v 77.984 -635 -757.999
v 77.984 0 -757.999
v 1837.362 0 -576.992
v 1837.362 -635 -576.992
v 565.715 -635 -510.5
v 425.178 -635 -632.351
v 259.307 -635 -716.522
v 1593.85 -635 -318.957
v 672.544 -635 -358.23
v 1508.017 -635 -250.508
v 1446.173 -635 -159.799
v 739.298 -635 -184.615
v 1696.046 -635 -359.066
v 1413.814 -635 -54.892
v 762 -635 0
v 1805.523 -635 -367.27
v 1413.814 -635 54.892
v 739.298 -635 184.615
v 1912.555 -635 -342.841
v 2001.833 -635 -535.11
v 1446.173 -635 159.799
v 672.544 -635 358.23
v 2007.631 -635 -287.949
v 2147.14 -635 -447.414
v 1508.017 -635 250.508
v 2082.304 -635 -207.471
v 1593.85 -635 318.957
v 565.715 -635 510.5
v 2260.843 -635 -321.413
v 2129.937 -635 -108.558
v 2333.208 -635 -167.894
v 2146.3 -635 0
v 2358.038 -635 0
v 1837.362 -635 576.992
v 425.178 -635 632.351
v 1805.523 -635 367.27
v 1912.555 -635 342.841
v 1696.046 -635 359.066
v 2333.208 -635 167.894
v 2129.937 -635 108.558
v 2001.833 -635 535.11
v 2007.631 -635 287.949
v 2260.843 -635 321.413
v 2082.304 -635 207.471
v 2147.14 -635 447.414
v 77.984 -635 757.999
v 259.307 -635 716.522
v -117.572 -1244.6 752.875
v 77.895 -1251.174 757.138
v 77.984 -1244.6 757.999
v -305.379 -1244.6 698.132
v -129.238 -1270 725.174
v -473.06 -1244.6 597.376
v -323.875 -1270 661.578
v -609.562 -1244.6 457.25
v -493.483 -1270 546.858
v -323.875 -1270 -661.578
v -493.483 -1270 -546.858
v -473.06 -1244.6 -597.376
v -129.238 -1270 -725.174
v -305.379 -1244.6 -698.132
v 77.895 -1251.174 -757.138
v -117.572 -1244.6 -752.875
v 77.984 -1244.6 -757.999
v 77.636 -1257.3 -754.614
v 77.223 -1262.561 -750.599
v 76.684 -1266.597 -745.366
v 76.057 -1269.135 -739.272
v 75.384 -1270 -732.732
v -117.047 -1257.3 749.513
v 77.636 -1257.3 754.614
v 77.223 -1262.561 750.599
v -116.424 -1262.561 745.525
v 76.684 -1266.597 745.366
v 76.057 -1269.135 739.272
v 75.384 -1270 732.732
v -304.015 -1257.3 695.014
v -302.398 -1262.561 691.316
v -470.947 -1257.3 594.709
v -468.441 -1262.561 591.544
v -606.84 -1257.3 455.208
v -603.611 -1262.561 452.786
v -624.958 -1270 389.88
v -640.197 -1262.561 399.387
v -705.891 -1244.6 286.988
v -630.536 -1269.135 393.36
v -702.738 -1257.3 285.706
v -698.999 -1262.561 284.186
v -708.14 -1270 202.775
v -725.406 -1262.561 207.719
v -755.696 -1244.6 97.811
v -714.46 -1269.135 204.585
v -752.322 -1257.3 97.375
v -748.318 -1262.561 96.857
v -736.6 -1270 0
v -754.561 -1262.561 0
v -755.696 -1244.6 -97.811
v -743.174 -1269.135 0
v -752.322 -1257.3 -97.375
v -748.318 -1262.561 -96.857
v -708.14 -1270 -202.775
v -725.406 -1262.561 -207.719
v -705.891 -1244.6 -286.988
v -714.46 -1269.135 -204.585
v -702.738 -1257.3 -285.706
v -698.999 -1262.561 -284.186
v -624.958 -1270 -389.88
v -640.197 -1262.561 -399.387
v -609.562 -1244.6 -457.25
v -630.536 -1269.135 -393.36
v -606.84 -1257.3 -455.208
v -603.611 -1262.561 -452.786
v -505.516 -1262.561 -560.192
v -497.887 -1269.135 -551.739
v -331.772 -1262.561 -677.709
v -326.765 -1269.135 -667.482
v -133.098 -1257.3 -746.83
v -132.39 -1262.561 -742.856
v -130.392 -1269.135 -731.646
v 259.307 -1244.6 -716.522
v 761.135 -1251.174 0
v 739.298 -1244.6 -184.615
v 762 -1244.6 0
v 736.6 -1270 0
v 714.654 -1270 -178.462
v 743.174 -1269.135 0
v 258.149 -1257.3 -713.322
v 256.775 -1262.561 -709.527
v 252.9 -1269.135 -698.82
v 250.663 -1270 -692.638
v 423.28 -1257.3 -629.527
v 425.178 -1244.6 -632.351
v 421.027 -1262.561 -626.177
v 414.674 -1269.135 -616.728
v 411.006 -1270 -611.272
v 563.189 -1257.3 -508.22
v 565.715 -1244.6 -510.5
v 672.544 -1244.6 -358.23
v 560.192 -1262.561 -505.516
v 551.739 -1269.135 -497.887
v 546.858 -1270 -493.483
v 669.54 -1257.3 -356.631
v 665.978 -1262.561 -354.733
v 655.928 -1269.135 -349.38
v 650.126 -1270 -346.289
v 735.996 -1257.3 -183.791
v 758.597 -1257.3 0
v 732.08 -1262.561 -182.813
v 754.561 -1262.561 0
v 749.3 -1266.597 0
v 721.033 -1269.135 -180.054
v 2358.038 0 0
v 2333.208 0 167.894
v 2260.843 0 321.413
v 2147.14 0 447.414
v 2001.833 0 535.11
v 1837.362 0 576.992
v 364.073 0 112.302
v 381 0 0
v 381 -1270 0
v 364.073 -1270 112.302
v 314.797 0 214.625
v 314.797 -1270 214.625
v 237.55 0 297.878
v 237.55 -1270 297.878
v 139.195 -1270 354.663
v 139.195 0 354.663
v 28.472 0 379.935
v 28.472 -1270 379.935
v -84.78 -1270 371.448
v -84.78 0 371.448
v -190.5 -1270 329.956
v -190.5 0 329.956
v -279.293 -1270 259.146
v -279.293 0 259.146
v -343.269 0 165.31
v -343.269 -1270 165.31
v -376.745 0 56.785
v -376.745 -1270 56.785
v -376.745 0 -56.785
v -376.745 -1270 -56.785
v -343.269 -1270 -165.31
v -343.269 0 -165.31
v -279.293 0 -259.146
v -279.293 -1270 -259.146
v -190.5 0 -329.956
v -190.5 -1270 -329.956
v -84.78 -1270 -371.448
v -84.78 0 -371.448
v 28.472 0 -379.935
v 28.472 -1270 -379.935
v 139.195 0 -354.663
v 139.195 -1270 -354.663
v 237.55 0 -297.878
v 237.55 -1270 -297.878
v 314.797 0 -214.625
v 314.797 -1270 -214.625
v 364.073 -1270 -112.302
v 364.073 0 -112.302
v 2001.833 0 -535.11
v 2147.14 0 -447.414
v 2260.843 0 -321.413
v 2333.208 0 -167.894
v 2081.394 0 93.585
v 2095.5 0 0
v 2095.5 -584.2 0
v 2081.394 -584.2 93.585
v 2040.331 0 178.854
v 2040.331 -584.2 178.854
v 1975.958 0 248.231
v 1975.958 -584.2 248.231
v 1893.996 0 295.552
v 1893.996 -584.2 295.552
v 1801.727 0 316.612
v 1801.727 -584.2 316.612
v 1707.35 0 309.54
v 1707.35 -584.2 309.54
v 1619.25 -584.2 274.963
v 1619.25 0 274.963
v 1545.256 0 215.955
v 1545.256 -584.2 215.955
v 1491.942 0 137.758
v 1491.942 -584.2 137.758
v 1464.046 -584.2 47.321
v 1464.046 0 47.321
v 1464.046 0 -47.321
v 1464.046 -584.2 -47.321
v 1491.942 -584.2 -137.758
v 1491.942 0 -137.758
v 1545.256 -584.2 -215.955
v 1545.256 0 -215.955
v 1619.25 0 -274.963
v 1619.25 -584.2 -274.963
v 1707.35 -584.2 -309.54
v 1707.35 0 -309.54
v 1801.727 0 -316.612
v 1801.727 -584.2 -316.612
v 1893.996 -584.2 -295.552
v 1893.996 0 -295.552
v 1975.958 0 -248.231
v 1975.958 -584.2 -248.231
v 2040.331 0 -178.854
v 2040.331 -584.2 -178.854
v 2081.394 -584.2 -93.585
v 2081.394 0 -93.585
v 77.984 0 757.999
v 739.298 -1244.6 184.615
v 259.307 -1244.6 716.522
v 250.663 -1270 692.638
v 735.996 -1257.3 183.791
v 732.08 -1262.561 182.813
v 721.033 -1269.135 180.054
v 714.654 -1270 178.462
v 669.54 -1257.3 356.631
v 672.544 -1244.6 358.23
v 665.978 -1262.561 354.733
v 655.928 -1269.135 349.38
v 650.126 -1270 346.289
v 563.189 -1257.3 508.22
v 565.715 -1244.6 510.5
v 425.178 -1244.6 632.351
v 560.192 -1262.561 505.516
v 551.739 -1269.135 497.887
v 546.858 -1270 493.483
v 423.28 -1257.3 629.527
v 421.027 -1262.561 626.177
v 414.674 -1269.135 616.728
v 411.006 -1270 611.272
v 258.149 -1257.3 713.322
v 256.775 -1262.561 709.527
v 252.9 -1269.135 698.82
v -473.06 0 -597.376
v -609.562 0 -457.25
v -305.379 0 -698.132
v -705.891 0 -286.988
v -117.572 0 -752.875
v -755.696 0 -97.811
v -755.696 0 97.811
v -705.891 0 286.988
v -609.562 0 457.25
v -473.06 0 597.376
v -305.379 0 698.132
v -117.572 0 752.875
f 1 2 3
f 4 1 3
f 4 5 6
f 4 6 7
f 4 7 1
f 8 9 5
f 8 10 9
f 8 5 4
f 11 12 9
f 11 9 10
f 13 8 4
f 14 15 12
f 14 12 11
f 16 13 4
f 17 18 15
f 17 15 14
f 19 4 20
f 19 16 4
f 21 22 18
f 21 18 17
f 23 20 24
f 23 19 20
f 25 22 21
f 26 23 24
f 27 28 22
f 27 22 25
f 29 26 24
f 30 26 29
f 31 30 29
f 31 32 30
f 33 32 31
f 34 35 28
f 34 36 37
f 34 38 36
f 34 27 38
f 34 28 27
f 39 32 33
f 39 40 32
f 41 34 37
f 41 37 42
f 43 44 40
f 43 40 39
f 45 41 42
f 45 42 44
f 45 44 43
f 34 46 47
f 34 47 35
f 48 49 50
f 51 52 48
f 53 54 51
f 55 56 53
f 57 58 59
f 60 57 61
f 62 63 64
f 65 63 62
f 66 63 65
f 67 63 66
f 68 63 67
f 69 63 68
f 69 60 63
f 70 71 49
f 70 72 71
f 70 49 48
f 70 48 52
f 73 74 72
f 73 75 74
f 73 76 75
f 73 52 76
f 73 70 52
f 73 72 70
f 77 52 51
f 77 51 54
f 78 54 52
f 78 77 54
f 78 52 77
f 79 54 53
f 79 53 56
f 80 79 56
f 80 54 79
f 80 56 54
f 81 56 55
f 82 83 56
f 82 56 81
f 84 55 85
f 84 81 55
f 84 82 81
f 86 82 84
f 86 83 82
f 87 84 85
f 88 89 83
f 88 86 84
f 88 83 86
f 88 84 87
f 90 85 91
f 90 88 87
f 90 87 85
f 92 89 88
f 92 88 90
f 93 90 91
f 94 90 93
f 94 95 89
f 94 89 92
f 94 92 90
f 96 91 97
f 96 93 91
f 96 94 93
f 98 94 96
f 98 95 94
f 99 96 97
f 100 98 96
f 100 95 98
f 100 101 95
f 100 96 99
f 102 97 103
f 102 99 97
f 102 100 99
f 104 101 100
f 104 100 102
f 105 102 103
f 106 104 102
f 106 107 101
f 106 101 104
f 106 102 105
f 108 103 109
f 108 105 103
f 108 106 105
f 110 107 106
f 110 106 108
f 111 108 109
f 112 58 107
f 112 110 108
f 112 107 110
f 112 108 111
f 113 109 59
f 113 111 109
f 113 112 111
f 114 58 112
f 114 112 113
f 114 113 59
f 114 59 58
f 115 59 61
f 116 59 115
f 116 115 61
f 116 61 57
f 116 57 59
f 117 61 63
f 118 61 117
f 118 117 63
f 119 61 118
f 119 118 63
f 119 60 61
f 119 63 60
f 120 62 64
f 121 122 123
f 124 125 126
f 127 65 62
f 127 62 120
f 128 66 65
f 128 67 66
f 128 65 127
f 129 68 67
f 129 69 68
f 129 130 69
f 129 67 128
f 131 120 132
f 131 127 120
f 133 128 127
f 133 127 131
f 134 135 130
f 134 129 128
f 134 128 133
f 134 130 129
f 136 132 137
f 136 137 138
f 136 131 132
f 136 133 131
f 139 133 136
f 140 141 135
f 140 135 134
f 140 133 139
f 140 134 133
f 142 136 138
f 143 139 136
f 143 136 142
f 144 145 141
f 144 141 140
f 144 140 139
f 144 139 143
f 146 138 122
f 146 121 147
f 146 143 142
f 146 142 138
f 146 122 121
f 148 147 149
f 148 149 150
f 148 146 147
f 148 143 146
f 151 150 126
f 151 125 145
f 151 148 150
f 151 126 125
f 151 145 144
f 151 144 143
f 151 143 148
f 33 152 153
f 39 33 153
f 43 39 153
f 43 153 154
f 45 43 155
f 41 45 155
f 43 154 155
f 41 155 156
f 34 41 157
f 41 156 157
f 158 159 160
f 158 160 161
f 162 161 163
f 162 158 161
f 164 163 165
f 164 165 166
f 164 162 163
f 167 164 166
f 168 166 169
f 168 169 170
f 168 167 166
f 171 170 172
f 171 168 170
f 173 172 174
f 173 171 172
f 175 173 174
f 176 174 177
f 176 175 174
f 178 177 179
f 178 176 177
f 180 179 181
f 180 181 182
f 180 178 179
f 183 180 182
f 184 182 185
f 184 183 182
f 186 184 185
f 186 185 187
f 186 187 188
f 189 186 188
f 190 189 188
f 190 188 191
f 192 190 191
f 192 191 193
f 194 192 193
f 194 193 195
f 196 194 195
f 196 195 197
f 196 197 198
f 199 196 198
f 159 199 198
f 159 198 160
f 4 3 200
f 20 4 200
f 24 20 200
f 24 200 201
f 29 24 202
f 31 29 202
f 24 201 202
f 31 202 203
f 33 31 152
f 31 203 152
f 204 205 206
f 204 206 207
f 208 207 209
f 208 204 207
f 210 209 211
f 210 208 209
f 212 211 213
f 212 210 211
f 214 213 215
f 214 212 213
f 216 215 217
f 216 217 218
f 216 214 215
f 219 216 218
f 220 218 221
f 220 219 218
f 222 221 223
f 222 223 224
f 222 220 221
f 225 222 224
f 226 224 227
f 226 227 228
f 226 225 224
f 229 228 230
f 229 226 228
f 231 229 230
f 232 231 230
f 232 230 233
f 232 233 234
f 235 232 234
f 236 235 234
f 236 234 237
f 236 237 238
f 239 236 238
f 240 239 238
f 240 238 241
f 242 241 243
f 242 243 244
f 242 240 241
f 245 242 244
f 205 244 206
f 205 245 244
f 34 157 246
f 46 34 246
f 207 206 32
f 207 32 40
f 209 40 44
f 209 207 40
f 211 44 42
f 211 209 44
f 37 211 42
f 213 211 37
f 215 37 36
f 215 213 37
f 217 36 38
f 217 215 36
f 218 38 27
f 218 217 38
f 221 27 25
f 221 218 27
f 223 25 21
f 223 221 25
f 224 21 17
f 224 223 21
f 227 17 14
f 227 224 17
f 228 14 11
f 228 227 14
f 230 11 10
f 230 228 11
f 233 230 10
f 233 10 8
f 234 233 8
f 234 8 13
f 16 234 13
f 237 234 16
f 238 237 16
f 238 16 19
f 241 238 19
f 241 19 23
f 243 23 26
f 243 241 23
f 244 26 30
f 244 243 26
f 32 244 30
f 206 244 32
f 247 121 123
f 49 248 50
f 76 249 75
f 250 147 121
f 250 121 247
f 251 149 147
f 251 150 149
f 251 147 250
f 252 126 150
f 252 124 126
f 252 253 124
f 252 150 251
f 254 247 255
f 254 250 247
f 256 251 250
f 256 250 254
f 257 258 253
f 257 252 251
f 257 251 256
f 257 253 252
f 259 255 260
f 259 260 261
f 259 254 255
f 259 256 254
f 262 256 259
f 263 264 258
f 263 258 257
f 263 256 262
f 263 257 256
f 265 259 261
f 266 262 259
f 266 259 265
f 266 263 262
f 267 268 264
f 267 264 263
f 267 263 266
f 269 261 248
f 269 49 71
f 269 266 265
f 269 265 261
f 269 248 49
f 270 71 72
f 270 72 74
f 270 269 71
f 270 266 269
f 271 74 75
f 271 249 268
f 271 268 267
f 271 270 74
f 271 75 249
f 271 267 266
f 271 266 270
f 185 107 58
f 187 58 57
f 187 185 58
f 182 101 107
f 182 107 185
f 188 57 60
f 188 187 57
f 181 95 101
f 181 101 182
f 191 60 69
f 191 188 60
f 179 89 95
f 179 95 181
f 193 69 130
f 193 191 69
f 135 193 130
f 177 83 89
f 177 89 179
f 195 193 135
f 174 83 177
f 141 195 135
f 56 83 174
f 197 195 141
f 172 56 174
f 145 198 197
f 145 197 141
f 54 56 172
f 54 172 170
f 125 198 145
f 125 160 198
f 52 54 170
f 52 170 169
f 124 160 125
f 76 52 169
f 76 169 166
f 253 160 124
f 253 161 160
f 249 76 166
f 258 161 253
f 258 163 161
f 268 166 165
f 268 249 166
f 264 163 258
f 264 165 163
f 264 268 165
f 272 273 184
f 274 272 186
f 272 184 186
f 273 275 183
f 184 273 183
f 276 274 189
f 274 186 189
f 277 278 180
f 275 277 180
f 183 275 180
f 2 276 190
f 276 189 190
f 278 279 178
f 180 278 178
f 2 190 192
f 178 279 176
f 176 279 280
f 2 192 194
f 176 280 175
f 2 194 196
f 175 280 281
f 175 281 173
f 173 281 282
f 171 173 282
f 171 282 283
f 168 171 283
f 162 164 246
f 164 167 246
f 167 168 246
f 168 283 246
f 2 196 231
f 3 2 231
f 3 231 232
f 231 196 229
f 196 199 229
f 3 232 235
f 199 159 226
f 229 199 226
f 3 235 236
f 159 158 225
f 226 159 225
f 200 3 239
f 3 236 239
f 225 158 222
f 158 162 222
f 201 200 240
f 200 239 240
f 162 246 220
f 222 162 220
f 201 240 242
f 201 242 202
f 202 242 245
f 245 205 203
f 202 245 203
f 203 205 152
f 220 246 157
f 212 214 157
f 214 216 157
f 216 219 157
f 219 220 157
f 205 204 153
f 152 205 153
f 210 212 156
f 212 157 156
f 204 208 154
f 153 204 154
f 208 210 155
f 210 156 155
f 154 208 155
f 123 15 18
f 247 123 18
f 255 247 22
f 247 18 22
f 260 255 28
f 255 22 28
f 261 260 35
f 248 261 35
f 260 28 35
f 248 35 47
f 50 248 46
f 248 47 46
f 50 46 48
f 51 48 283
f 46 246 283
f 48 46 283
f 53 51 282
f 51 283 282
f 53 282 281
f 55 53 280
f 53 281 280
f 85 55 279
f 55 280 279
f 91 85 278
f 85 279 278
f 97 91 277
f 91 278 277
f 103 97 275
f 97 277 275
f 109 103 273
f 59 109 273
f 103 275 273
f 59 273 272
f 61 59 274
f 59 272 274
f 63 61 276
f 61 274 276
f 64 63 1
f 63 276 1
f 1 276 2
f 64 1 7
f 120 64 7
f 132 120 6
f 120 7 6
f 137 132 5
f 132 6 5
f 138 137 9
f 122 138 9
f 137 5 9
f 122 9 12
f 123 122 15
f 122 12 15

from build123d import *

# Parameters (mm, degrees)
F0_R     = 317.5
F0_R_2   = 381
F1_DEPTH = 635
F2_DEPTH = 1270
F3_R     = 25.4
F4_SIZE  = 50.8


with BuildPart() as f1:
    # F0 (on Front) → F1 (new body)
    with BuildSketch(Plane.XZ):
        with BuildLine():
            ThreePointArc((2358.037624, 0), (2208.624917, 388.59468), (1837.361656, 576.992061))
            ThreePointArc((1837.361656, 576.992061), (1197.962376, 0), (1837.361656, -576.992061))
            ThreePointArc((1837.361656, -576.992061), (2208.624917, -388.59468), (2358.037624, 0))
        make_face()
        with Locations((1778, 0)):
            Circle(F0_R, mode=Mode.SUBTRACT)
        with BuildLine():
            ThreePointArc((77.983876, -757.999021), (565.715349, -510.499896), (762, 0))
            ThreePointArc((762, 0), (565.715349, 510.499896), (77.983876, 757.999021))
            ThreePointArc((77.983876, 757.999021), (-762, 0), (77.983876, -757.999021))
        make_face()
        Circle(F0_R_2, mode=Mode.SUBTRACT)
        with BuildLine():
            ThreePointArc((77.983876, 757.999021), (565.715349, 510.499896), (762, 0))
            ThreePointArc((762, 0), (565.715349, -510.499896), (77.983876, -757.999021))
            Line((77.983876, -757.999021), (1837.361656, -576.992061))
            ThreePointArc((1837.361656, -576.992061), (1197.962376, 0), (1837.361656, 576.992061))
            Line((1837.361656, 576.992061), (77.983876, 757.999021))
        make_face()
    extrude(amount=F1_DEPTH)

    # F0 (on Front) → F2 (join)
    with BuildSketch(Plane.XZ):
        with BuildLine():
            ThreePointArc((77.983876, -757.999021), (565.715349, -510.499896), (762, 0))
            ThreePointArc((762, 0), (565.715349, 510.499896), (77.983876, 757.999021))
            ThreePointArc((77.983876, 757.999021), (-762, 0), (77.983876, -757.999021))
        make_face()
        Circle(F0_R_2, mode=Mode.SUBTRACT)
    extrude(amount=F2_DEPTH)

    # F3
    f3_edges = [f1.edges().sort_by_distance(p)[0] for p in [
        (-77.983876, -1270, 757.999021),
    ]]
    fillet(f3_edges, radius=F3_R)

    # F4
    f4_edges = [f1.edges().sort_by_distance(p)[0] for p in [
        (1460.5, -635, 0),
    ]]
    chamfer(f4_edges, length=F4_SIZE)


solid = f1.part
